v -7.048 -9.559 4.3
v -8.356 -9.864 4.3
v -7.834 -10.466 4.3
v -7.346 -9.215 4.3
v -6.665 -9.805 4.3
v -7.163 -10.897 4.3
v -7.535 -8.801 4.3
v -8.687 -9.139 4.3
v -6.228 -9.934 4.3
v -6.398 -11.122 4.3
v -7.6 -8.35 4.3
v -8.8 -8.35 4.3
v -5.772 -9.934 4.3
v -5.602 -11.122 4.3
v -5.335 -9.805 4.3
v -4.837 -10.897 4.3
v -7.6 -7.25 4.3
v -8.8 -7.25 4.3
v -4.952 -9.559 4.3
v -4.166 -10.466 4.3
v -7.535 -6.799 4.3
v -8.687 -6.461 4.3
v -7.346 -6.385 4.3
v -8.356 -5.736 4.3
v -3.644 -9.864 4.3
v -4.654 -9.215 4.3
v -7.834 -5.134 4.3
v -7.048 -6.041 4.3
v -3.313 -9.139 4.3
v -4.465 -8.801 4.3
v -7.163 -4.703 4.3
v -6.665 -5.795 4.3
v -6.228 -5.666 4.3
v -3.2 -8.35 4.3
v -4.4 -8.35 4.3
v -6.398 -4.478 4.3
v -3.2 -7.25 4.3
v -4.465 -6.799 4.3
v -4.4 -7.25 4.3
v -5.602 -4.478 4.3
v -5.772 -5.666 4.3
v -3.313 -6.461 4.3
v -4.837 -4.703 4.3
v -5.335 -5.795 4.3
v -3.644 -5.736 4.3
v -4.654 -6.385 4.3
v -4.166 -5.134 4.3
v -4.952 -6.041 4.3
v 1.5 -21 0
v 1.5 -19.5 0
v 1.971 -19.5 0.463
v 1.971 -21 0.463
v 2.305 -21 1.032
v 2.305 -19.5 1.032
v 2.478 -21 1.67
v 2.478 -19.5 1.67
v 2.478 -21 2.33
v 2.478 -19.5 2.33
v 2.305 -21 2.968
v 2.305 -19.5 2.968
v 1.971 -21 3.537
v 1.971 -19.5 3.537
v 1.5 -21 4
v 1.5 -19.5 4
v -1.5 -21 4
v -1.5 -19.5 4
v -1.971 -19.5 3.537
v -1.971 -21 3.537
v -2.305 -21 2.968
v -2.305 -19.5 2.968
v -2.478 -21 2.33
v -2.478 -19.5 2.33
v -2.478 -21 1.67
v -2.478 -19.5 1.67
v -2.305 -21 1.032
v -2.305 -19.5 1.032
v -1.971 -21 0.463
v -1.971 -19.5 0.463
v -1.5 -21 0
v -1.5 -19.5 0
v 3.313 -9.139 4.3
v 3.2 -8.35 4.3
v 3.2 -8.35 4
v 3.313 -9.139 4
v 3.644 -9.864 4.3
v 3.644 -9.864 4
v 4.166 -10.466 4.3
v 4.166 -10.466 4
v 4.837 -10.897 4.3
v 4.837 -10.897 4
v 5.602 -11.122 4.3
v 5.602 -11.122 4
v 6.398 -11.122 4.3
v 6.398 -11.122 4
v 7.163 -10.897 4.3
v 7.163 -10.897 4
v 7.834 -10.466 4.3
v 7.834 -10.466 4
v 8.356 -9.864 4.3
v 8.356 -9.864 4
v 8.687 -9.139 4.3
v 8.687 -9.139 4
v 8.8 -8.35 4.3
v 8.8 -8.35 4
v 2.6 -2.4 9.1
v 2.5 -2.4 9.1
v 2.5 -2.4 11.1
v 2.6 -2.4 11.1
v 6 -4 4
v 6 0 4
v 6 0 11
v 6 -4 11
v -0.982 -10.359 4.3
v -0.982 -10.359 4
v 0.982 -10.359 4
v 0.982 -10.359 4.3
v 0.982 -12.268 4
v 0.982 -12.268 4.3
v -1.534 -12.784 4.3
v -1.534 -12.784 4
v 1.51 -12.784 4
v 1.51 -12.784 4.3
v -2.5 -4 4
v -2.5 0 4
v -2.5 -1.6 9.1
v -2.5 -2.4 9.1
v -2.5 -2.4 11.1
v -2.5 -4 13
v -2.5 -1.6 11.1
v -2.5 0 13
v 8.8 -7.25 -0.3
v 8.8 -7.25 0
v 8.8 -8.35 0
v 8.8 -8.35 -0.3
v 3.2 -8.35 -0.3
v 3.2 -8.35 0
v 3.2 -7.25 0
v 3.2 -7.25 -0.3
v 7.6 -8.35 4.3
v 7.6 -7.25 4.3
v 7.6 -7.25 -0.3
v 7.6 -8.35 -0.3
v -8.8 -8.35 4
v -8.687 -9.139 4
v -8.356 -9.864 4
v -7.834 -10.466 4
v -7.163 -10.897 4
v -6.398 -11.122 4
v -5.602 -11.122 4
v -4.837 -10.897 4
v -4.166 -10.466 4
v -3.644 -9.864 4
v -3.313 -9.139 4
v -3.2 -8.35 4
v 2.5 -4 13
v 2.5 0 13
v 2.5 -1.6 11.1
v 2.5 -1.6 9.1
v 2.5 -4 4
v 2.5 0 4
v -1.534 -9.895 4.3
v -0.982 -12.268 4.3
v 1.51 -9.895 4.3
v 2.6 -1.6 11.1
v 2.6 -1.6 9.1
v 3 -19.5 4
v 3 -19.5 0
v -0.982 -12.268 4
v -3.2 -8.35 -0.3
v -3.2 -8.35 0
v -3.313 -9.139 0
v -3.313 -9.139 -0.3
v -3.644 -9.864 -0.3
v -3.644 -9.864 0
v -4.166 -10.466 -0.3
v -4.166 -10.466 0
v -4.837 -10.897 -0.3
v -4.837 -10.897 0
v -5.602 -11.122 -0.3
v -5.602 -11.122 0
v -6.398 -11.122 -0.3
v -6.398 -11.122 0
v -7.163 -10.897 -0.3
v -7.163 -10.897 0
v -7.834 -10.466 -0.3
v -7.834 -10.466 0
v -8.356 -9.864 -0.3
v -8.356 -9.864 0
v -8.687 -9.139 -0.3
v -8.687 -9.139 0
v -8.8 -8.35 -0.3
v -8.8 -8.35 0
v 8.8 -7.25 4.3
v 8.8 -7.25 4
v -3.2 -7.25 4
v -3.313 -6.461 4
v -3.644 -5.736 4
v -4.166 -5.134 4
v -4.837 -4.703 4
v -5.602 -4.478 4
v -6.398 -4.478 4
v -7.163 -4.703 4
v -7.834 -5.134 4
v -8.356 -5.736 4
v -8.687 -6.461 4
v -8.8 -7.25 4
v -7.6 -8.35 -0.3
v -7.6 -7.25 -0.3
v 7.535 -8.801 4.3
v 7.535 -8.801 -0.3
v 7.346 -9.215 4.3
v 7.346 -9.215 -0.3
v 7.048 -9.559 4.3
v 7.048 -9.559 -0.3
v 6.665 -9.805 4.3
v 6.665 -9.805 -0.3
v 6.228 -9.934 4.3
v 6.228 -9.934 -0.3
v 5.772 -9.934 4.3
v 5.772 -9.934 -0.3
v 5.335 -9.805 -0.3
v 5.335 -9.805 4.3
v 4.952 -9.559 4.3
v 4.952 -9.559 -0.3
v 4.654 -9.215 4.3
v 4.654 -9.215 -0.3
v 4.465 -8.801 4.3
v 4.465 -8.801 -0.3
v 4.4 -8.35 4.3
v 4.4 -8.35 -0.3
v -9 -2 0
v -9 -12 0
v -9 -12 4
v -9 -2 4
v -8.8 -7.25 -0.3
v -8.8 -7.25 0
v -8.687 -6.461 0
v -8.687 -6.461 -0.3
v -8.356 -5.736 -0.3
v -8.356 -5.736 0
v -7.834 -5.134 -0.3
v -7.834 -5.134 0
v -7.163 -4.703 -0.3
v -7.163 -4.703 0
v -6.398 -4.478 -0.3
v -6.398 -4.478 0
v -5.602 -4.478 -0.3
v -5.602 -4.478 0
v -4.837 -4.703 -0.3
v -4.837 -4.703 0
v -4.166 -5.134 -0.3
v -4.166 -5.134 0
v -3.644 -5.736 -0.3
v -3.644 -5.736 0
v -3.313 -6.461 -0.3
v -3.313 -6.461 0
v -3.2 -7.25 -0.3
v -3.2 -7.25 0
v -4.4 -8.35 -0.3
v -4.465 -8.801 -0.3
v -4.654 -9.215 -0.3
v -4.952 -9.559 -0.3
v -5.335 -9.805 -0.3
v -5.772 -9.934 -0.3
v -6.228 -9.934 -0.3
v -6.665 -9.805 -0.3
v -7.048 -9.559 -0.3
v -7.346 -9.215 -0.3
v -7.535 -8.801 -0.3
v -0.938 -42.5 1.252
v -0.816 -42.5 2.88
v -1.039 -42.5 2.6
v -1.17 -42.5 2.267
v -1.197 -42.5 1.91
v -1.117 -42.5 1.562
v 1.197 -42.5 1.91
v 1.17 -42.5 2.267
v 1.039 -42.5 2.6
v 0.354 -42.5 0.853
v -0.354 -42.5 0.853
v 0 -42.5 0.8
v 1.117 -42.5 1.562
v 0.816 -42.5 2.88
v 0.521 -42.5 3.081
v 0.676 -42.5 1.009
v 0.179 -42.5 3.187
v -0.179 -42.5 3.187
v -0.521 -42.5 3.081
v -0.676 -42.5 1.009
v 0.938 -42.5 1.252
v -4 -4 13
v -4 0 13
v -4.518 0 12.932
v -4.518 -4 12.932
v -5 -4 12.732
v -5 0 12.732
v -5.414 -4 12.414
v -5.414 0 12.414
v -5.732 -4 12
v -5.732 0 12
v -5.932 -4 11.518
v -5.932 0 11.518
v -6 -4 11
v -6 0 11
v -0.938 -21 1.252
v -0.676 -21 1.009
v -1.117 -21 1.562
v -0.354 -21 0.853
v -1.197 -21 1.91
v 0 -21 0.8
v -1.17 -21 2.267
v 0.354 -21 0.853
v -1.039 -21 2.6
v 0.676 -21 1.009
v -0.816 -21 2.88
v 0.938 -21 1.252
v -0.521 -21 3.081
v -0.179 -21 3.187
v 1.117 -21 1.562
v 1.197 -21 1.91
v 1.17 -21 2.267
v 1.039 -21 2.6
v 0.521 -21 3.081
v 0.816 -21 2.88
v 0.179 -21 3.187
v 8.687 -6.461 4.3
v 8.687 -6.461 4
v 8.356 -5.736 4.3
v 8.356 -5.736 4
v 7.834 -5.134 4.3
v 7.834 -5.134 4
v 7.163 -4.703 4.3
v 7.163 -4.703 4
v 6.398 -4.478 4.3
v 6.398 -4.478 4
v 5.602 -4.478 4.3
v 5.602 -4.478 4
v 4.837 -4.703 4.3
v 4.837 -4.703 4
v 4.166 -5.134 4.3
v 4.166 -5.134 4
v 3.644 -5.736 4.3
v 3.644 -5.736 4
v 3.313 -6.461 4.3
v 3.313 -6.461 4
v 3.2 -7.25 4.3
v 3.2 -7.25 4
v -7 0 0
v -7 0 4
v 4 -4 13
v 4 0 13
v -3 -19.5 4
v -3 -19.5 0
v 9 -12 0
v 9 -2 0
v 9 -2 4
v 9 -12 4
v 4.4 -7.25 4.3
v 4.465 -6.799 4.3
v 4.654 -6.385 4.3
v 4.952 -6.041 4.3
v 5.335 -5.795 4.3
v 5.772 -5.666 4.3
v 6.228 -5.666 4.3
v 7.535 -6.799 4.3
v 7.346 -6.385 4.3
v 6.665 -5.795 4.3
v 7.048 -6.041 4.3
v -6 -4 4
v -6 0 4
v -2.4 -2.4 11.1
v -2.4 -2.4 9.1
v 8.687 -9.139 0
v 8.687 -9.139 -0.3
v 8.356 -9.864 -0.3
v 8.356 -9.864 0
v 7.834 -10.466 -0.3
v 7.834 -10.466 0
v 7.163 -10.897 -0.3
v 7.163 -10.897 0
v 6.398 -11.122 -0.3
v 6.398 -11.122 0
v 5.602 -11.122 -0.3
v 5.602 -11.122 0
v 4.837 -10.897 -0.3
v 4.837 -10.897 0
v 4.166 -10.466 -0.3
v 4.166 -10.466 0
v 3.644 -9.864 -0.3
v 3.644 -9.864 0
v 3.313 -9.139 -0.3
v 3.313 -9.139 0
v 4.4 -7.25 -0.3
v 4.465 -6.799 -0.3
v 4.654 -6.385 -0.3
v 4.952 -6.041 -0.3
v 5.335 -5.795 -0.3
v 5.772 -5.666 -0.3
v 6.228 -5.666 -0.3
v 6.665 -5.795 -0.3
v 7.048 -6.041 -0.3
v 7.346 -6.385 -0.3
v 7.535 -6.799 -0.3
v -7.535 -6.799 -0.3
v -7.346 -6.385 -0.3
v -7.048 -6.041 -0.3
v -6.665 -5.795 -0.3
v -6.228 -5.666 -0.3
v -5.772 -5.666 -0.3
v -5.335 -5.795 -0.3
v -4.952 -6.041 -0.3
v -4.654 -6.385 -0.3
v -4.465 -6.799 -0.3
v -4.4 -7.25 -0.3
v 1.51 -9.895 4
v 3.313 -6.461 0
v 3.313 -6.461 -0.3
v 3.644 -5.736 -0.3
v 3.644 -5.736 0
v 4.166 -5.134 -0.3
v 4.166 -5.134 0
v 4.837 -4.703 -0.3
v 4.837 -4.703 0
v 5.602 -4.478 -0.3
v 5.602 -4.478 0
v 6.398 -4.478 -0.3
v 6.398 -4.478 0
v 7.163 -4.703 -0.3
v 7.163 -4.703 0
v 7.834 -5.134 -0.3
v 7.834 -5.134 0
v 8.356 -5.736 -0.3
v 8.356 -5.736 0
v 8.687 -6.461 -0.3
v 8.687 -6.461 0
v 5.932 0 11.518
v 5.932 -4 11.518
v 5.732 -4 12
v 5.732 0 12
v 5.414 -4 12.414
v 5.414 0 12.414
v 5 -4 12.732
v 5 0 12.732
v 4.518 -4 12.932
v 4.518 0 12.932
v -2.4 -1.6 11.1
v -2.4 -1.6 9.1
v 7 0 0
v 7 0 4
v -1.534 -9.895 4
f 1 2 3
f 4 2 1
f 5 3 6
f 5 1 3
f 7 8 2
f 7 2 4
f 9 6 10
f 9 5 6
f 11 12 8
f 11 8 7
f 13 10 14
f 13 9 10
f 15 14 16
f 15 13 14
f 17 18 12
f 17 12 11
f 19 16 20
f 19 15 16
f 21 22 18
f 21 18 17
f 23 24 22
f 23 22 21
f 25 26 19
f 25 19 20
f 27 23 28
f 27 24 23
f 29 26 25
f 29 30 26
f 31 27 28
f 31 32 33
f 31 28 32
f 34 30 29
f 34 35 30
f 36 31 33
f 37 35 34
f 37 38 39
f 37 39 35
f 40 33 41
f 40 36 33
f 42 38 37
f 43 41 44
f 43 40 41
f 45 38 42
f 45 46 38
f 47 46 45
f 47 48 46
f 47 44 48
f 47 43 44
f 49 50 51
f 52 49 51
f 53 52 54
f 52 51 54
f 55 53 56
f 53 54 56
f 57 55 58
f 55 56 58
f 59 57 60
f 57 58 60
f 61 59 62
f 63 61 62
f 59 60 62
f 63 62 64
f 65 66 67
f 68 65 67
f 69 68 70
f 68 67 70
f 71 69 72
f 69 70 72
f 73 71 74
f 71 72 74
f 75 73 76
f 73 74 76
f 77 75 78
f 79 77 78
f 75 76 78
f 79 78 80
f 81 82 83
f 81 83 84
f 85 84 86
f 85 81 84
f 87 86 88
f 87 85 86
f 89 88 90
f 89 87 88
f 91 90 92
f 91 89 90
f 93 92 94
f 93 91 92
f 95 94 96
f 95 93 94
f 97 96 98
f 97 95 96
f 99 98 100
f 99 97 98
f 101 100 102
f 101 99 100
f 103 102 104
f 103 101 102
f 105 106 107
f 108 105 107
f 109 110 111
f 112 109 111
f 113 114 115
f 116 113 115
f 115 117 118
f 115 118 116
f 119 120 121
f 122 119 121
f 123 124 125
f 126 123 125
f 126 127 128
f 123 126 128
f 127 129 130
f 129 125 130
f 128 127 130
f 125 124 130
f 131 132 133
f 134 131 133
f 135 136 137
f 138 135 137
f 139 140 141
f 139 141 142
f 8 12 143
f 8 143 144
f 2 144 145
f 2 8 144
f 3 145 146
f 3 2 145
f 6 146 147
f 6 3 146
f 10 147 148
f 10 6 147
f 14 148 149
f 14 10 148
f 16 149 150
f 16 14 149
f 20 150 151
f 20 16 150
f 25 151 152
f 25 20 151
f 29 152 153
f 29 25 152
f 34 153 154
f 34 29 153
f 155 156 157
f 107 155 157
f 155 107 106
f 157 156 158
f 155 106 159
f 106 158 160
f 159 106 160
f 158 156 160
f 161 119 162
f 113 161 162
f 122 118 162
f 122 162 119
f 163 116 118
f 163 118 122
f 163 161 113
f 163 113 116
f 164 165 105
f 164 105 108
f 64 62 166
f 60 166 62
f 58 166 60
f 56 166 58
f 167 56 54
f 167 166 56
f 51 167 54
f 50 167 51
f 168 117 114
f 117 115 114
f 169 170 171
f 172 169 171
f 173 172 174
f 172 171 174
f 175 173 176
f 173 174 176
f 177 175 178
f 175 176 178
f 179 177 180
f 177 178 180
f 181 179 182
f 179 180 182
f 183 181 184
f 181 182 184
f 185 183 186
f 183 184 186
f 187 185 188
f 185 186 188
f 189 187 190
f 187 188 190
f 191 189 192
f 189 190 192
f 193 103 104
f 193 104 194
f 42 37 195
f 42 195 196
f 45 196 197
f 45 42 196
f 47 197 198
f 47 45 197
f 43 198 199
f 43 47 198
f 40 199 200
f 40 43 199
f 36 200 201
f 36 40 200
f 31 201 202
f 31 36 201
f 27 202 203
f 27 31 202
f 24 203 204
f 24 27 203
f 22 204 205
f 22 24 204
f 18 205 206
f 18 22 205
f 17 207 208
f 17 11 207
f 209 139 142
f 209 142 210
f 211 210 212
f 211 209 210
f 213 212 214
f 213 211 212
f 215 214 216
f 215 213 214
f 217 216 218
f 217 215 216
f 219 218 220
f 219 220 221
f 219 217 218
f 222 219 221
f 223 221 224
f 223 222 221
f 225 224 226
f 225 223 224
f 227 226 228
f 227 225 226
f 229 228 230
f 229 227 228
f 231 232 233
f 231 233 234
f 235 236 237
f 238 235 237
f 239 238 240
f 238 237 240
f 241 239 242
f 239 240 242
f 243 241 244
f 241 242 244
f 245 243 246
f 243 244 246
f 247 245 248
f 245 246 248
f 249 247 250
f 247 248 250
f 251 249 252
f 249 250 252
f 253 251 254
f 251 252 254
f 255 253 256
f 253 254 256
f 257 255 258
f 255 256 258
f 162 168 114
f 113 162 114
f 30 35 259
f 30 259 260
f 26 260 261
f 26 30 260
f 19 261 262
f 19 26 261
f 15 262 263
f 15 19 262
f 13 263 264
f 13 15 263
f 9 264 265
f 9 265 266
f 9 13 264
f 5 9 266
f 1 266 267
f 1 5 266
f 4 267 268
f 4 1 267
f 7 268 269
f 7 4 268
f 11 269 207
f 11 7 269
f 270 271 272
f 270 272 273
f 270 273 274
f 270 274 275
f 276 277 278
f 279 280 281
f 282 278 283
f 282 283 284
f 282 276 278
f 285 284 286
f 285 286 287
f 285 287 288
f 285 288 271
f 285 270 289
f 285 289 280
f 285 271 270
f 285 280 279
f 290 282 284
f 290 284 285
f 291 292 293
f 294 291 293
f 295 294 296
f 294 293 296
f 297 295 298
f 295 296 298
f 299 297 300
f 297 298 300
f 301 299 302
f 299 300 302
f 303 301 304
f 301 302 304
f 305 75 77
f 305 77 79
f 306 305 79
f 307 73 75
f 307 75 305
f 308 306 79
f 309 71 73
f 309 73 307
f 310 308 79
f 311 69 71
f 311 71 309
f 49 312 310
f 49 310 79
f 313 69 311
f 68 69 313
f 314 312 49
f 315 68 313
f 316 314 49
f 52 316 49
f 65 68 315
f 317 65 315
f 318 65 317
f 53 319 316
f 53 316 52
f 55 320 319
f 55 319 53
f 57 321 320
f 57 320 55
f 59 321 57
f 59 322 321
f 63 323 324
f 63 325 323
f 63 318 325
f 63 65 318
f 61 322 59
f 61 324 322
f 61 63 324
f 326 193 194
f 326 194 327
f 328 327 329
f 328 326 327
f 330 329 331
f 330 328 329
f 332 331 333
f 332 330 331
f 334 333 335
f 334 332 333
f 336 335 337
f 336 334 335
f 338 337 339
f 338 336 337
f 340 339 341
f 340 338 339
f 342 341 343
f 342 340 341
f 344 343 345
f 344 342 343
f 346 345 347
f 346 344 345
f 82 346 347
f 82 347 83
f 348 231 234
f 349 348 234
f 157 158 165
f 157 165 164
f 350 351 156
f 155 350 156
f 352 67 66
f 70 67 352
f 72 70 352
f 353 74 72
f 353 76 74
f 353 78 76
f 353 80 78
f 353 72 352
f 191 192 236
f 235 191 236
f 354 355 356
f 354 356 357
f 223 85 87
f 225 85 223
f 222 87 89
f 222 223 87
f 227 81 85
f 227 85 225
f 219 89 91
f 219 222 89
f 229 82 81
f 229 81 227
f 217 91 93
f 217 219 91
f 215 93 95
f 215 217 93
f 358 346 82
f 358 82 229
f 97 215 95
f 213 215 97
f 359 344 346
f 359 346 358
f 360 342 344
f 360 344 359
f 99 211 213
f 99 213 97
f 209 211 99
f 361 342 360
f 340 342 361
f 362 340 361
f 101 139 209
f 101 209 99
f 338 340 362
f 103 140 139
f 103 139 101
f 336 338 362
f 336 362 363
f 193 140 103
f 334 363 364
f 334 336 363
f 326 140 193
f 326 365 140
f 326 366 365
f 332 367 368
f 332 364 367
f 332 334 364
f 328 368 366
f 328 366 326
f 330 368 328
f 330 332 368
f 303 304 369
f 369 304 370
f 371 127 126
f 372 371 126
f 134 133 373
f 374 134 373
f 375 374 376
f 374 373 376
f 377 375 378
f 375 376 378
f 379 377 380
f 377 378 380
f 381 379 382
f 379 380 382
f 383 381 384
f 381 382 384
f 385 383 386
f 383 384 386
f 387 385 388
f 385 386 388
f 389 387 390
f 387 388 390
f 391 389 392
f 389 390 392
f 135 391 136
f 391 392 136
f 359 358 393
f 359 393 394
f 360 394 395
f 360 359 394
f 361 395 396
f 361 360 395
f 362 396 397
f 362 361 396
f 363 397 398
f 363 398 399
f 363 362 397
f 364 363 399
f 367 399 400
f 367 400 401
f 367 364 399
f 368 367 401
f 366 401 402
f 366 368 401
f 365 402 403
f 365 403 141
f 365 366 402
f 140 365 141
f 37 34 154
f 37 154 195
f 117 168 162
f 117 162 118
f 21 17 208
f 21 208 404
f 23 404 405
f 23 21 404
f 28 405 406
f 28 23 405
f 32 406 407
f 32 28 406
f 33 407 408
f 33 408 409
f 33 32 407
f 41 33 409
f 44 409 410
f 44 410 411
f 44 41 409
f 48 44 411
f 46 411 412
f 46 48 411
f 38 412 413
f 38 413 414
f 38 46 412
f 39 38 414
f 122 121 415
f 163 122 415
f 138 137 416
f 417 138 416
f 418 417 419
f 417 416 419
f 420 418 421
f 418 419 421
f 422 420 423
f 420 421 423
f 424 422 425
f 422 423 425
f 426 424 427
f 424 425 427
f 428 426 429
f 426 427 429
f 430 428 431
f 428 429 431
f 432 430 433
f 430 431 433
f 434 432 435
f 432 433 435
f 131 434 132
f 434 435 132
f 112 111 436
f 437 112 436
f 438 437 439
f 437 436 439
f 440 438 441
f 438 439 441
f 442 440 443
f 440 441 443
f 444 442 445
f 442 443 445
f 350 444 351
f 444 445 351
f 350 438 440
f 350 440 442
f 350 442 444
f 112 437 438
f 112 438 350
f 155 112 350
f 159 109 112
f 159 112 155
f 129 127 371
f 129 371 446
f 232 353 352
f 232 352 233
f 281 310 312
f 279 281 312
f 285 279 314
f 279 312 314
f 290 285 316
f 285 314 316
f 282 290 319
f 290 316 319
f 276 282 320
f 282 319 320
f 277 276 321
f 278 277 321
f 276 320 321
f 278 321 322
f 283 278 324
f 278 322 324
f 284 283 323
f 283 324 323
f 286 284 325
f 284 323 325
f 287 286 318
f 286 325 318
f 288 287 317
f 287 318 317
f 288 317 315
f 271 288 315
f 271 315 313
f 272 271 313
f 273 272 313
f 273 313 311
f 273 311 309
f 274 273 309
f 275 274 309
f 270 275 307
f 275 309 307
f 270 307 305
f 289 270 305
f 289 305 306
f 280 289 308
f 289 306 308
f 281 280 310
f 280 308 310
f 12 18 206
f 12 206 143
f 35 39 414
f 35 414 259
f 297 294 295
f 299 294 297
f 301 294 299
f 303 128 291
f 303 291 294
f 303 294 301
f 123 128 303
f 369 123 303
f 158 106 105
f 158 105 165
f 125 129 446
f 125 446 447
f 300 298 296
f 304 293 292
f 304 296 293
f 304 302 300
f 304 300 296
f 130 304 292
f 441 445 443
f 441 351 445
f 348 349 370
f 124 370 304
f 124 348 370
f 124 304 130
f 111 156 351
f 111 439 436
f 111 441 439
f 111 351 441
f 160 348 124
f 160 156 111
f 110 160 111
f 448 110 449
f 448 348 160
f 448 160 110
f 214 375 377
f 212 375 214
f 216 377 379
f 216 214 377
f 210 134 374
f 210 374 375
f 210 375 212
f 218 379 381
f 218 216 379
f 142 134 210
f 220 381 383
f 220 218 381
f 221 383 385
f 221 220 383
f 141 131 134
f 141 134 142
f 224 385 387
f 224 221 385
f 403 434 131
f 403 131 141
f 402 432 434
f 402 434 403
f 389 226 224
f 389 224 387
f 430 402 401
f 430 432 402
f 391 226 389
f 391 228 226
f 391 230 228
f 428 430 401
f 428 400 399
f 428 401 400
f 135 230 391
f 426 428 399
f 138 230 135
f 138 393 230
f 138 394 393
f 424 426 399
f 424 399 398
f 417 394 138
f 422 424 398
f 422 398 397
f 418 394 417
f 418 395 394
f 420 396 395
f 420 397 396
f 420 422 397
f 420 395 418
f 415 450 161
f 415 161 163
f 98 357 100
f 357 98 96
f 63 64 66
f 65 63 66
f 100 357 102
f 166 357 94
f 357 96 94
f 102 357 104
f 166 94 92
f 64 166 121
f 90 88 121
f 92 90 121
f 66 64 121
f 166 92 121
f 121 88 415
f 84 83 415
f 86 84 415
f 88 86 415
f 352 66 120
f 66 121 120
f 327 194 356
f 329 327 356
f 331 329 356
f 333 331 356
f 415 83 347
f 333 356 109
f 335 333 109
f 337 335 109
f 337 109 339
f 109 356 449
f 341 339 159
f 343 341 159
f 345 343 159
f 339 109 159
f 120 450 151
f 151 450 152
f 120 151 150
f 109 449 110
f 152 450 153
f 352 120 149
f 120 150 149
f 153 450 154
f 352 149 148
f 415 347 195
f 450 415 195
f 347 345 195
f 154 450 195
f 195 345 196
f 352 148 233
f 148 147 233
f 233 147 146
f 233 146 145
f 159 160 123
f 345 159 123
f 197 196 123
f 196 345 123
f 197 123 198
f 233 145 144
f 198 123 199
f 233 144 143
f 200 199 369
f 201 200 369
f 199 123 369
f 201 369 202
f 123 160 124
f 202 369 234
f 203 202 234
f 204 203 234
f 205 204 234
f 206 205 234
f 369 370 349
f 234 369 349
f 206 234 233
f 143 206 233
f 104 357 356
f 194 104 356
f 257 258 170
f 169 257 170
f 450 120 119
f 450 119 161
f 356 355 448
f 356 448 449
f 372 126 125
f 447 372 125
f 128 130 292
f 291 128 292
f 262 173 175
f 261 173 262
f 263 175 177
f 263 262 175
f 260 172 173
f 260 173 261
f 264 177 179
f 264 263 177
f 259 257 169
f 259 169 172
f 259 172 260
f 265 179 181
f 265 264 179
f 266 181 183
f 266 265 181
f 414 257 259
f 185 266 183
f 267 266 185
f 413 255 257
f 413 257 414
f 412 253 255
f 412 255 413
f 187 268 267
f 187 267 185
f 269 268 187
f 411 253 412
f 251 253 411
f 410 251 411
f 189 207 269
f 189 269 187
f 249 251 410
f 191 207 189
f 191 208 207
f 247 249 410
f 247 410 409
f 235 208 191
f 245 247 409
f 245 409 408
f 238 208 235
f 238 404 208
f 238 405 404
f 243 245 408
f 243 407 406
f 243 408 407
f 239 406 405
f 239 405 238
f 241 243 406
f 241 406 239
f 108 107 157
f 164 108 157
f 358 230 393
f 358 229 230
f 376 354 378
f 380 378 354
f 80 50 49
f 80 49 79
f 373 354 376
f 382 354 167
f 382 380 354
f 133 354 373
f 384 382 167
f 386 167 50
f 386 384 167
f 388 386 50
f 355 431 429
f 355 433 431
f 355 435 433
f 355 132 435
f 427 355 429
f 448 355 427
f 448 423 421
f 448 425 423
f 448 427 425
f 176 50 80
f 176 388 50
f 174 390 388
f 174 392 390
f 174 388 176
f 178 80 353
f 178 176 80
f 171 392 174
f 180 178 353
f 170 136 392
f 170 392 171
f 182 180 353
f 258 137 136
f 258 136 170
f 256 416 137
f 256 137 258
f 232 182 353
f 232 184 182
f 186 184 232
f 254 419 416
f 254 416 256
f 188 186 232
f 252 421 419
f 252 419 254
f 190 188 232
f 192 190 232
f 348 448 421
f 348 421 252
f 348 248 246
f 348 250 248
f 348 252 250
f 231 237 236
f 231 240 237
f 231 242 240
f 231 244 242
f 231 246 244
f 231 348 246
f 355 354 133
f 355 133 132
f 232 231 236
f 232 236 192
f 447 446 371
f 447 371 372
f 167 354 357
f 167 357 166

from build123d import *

# Parameters (mm, degrees)
EXTRUDE_1_DEPTH     = 4
EXTRUDE_2_DEPTH     = 4
EXTRUDE_3_DEPTH     = 1.5
SKETCH_4_R          = 1.2
EXTRUDE_4_DEPTH     = 21.5
CHAMFER_1_SIZE      = 2
SKETCH_5_W          = 2
SKETCH_5_H          = 0.8
EXTRUDE_7_DEPTH     = 0.1
SKETCH_6_W          = 2
SKETCH_6_H          = 0.8
CUT_EXTRUDE_2_DEPTH = 0.1
CUT_EXTRUDE_3_REACH = 46.365
EXTRUDE_START       = 0.3
EXTRUDE_8_DEPTH     = 0.3
EXTRUDE_9_DEPTH     = 0.3
SKETCH_10_W         = 3.044276786
SKETCH_10_H         = 2.889483051
SKETCH_10_W_2       = 1.964865926
SKETCH_10_H_2       = 1.90912273
EXTRUDE_10_DEPTH    = 0.3


with BuildPart() as part:
    # 草圖1 → 伸長1 (new body)
    with BuildSketch(Plane.XY):
        Polygon((-9, 0), (9, 0), (9, -12), (3, -19.5), (-3, -19.5), (-9, -12), align=None)
    extrude(amount=EXTRUDE_1_DEPTH)

    # 草圖2 → 伸長2 (add)
    with BuildSketch(Plane(origin=(0, 0, 0), x_dir=(1, 0, 0), z_dir=(0, 1, 0))):
        with BuildLine():
            Line((-6, -4), (-2.5, -4))
            Line((-2.5, -4), (-2.5, -13))
            Line((-2.5, -13), (-4, -13))
            ThreePointArc((-4, -13), (-5.414213562, -12.414213562), (-6, -11))
            Line((-6, -11), (-6, -4))
        make_face()
        with BuildLine():
            Line((2.5, -4), (6, -4))
            Line((6, -4), (6, -11))
            ThreePointArc((6, -11), (5.414213562, -12.414213562), (4, -13))
            Line((4, -13), (2.5, -13))
            Line((2.5, -13), (2.5, -4))
        make_face()
    extrude(amount=-EXTRUDE_2_DEPTH)

    # 草圖3 → 伸長3 (add)
    with BuildSketch(Plane.XZ.offset(19.5)):
        with BuildLine():
            Line((-1.5, 0), (1.5, 0))
            ThreePointArc((1.5, 0), (2.5, 2), (1.5, 4))
            Line((1.5, 4), (-1.5, 4))
            ThreePointArc((-1.5, 4), (-2.5, 2), (-1.5, 0))
        make_face()
    extrude(amount=EXTRUDE_3_DEPTH)

    # 草圖4 → 伸長4 (add)
    with BuildSketch(Plane.XZ.offset(21)):
        with Locations(Location((0, 2, 0), (0, 0, 270))):
            Circle(SKETCH_4_R)
    extrude(amount=EXTRUDE_4_DEPTH)

    # 導角1
    chamfer_1_edges = [part.edges().sort_by_distance(p)[0] for p in [
        (9, 0, 2),
        (-9, 0, 2),
    ]]
    chamfer(chamfer_1_edges, length=CHAMFER_1_SIZE)

    # 草圖5 → 伸長7 (add)
    with BuildSketch(Plane(origin=(-2.5, 0, 0), x_dir=(0, 0, -1), z_dir=(1, 0, 0))):
        with Locations((-10.1, -2)):
            Rectangle(SKETCH_5_W, SKETCH_5_H)
    extrude(amount=EXTRUDE_7_DEPTH)

    # 草圖6 → 除料-伸長2 (cut)
    with BuildSketch(Plane.ZY.offset(-2.5)):
        with Locations((10.1, -2)):
            Rectangle(SKETCH_6_W, SKETCH_6_H)
    extrude(amount=-CUT_EXTRUDE_2_DEPTH, mode=Mode.SUBTRACT)

    # 草圖7 → 除料-伸長3 (cut, up to next)
    with BuildSketch(Plane.XY.offset(4), mode=Mode.PRIVATE) as cut_extrude_3_sk1:
        with BuildLine():
            Line((-7.6, -7.25), (-7.6, -8.35))
            ThreePointArc((-7.6, -8.35), (-6, -9.95), (-4.4, -8.35))
            Line((-4.4, -8.35), (-4.4, -7.25))
            ThreePointArc((-4.4, -7.25), (-6, -5.65), (-7.6, -7.25))
        make_face()
    cut_extrude_3_tool1 = extrude(cut_extrude_3_sk1.sketch, amount=-CUT_EXTRUDE_3_REACH, mode=Mode.PRIVATE) & part.part
    # 草圖7 → 除料-伸長3 (cut, up to next)
    with BuildSketch(Plane.XY.offset(4), mode=Mode.PRIVATE) as cut_extrude_3_sk2:
        with BuildLine():
            Line((4.4, -7.25), (4.4, -8.35))
            ThreePointArc((4.4, -8.35), (6, -9.95), (7.6, -8.35))
            Line((7.6, -8.35), (7.6, -7.25))
            ThreePointArc((7.6, -7.25), (6, -5.65), (4.4, -7.25))
        make_face()
    cut_extrude_3_tool2 = extrude(cut_extrude_3_sk2.sketch, amount=-CUT_EXTRUDE_3_REACH, mode=Mode.PRIVATE) & part.part
    add(cut_extrude_3_tool1.solids().sort_by_distance((-6, -7.8, 4))[0], mode=Mode.SUBTRACT)
    add(cut_extrude_3_tool2.solids().sort_by_distance((6, -7.8, 4))[0], mode=Mode.SUBTRACT)

    # 草圖8 → 伸長8 (add)
    # profile 1 of 2: a face of its own
    with BuildSketch(Plane.XY.offset(4).offset(EXTRUDE_START)):
        with BuildLine():
            Line((3.2, -7.25), (3.2, -8.35))
            ThreePointArc((3.2, -8.35), (6, -11.15), (8.8, -8.35))
            Line((8.8, -8.35), (8.8, -7.25))
            ThreePointArc((8.8, -7.25), (6, -4.45), (3.2, -7.25))
        make_face()
        with BuildLine():
            Line((4.4, -7.25), (4.4, -8.35))
            ThreePointArc((4.4, -8.35), (6, -9.95), (7.6, -8.35))
            Line((7.6, -8.35), (7.6, -7.25))
            ThreePointArc((7.6, -7.25), (6, -5.65), (4.4, -7.25))
        make_face(mode=Mode.SUBTRACT)
    # profile 2 of 2: a face of its own
    with BuildSketch(Plane.XY.offset(4).offset(EXTRUDE_START)):
        with BuildLine():
            Line((-8.8, -7.25), (-8.8, -8.35))
            ThreePointArc((-8.8, -8.35), (-6, -11.15), (-3.2, -8.35))
            Line((-3.2, -8.35), (-3.2, -7.25))
            ThreePointArc((-3.2, -7.25), (-6, -4.45), (-8.8, -7.25))
        make_face()
        with BuildLine():
            Line((-7.6, -7.25), (-7.6, -8.35))
            ThreePointArc((-7.6, -8.35), (-6, -9.95), (-4.4, -8.35))
            Line((-4.4, -8.35), (-4.4, -7.25))
            ThreePointArc((-4.4, -7.25), (-6, -5.65), (-7.6, -7.25))
        make_face(mode=Mode.SUBTRACT)
    extrude(amount=-EXTRUDE_8_DEPTH)

    # 草圖9 → 伸長9 (add)
    # profile 1 of 2: a face of its own
    with BuildSketch(Plane(origin=(0, 0, 0), x_dir=(-1, 0, 0), z_dir=(0, 0, -1))):
        with BuildLine():
            Line((-3.2, -8.35), (-3.2, -7.25))
            ThreePointArc((-3.2, -7.25), (-6, -4.45), (-8.8, -7.25))
            Line((-8.8, -7.25), (-8.8, -8.35))
            ThreePointArc((-8.8, -8.35), (-6, -11.15), (-3.2, -8.35))
        make_face()
        with BuildLine():
            Line((-4.4, -8.35), (-4.4, -7.25))
            ThreePointArc((-4.4, -7.25), (-6, -5.65), (-7.6, -7.25))
            Line((-7.6, -7.25), (-7.6, -8.35))
            ThreePointArc((-7.6, -8.35), (-6, -9.95), (-4.4, -8.35))
        make_face(mode=Mode.SUBTRACT)
    # profile 2 of 2: a face of its own
    with BuildSketch(Plane(origin=(0, 0, 0), x_dir=(-1, 0, 0), z_dir=(0, 0, -1))):
        with BuildLine():
            Line((8.8, -8.35), (8.8, -7.25))
            ThreePointArc((8.8, -7.25), (6, -4.45), (3.2, -7.25))
            Line((3.2, -7.25), (3.2, -8.35))
            ThreePointArc((3.2, -8.35), (6, -11.15), (8.8, -8.35))
        make_face()
        with BuildLine():
            Line((7.6, -8.35), (7.6, -7.25))
            ThreePointArc((7.6, -7.25), (6, -5.65), (4.4, -7.25))
            Line((4.4, -7.25), (4.4, -8.35))
            ThreePointArc((4.4, -8.35), (6, -9.95), (7.6, -8.35))
        make_face(mode=Mode.SUBTRACT)
    extrude(amount=EXTRUDE_9_DEPTH)

    # 草圖10 → 伸長10 (add)
    with BuildSketch(Plane.XY.offset(4)):
        with Locations((-0.011782979, -11.3393837)):
            Rectangle(SKETCH_10_W, SKETCH_10_H)
        with Locations((0, -11.313584744)):
            Rectangle(SKETCH_10_W_2, SKETCH_10_H_2, mode=Mode.SUBTRACT)
    extrude(amount=EXTRUDE_10_DEPTH)


solid = part.part
